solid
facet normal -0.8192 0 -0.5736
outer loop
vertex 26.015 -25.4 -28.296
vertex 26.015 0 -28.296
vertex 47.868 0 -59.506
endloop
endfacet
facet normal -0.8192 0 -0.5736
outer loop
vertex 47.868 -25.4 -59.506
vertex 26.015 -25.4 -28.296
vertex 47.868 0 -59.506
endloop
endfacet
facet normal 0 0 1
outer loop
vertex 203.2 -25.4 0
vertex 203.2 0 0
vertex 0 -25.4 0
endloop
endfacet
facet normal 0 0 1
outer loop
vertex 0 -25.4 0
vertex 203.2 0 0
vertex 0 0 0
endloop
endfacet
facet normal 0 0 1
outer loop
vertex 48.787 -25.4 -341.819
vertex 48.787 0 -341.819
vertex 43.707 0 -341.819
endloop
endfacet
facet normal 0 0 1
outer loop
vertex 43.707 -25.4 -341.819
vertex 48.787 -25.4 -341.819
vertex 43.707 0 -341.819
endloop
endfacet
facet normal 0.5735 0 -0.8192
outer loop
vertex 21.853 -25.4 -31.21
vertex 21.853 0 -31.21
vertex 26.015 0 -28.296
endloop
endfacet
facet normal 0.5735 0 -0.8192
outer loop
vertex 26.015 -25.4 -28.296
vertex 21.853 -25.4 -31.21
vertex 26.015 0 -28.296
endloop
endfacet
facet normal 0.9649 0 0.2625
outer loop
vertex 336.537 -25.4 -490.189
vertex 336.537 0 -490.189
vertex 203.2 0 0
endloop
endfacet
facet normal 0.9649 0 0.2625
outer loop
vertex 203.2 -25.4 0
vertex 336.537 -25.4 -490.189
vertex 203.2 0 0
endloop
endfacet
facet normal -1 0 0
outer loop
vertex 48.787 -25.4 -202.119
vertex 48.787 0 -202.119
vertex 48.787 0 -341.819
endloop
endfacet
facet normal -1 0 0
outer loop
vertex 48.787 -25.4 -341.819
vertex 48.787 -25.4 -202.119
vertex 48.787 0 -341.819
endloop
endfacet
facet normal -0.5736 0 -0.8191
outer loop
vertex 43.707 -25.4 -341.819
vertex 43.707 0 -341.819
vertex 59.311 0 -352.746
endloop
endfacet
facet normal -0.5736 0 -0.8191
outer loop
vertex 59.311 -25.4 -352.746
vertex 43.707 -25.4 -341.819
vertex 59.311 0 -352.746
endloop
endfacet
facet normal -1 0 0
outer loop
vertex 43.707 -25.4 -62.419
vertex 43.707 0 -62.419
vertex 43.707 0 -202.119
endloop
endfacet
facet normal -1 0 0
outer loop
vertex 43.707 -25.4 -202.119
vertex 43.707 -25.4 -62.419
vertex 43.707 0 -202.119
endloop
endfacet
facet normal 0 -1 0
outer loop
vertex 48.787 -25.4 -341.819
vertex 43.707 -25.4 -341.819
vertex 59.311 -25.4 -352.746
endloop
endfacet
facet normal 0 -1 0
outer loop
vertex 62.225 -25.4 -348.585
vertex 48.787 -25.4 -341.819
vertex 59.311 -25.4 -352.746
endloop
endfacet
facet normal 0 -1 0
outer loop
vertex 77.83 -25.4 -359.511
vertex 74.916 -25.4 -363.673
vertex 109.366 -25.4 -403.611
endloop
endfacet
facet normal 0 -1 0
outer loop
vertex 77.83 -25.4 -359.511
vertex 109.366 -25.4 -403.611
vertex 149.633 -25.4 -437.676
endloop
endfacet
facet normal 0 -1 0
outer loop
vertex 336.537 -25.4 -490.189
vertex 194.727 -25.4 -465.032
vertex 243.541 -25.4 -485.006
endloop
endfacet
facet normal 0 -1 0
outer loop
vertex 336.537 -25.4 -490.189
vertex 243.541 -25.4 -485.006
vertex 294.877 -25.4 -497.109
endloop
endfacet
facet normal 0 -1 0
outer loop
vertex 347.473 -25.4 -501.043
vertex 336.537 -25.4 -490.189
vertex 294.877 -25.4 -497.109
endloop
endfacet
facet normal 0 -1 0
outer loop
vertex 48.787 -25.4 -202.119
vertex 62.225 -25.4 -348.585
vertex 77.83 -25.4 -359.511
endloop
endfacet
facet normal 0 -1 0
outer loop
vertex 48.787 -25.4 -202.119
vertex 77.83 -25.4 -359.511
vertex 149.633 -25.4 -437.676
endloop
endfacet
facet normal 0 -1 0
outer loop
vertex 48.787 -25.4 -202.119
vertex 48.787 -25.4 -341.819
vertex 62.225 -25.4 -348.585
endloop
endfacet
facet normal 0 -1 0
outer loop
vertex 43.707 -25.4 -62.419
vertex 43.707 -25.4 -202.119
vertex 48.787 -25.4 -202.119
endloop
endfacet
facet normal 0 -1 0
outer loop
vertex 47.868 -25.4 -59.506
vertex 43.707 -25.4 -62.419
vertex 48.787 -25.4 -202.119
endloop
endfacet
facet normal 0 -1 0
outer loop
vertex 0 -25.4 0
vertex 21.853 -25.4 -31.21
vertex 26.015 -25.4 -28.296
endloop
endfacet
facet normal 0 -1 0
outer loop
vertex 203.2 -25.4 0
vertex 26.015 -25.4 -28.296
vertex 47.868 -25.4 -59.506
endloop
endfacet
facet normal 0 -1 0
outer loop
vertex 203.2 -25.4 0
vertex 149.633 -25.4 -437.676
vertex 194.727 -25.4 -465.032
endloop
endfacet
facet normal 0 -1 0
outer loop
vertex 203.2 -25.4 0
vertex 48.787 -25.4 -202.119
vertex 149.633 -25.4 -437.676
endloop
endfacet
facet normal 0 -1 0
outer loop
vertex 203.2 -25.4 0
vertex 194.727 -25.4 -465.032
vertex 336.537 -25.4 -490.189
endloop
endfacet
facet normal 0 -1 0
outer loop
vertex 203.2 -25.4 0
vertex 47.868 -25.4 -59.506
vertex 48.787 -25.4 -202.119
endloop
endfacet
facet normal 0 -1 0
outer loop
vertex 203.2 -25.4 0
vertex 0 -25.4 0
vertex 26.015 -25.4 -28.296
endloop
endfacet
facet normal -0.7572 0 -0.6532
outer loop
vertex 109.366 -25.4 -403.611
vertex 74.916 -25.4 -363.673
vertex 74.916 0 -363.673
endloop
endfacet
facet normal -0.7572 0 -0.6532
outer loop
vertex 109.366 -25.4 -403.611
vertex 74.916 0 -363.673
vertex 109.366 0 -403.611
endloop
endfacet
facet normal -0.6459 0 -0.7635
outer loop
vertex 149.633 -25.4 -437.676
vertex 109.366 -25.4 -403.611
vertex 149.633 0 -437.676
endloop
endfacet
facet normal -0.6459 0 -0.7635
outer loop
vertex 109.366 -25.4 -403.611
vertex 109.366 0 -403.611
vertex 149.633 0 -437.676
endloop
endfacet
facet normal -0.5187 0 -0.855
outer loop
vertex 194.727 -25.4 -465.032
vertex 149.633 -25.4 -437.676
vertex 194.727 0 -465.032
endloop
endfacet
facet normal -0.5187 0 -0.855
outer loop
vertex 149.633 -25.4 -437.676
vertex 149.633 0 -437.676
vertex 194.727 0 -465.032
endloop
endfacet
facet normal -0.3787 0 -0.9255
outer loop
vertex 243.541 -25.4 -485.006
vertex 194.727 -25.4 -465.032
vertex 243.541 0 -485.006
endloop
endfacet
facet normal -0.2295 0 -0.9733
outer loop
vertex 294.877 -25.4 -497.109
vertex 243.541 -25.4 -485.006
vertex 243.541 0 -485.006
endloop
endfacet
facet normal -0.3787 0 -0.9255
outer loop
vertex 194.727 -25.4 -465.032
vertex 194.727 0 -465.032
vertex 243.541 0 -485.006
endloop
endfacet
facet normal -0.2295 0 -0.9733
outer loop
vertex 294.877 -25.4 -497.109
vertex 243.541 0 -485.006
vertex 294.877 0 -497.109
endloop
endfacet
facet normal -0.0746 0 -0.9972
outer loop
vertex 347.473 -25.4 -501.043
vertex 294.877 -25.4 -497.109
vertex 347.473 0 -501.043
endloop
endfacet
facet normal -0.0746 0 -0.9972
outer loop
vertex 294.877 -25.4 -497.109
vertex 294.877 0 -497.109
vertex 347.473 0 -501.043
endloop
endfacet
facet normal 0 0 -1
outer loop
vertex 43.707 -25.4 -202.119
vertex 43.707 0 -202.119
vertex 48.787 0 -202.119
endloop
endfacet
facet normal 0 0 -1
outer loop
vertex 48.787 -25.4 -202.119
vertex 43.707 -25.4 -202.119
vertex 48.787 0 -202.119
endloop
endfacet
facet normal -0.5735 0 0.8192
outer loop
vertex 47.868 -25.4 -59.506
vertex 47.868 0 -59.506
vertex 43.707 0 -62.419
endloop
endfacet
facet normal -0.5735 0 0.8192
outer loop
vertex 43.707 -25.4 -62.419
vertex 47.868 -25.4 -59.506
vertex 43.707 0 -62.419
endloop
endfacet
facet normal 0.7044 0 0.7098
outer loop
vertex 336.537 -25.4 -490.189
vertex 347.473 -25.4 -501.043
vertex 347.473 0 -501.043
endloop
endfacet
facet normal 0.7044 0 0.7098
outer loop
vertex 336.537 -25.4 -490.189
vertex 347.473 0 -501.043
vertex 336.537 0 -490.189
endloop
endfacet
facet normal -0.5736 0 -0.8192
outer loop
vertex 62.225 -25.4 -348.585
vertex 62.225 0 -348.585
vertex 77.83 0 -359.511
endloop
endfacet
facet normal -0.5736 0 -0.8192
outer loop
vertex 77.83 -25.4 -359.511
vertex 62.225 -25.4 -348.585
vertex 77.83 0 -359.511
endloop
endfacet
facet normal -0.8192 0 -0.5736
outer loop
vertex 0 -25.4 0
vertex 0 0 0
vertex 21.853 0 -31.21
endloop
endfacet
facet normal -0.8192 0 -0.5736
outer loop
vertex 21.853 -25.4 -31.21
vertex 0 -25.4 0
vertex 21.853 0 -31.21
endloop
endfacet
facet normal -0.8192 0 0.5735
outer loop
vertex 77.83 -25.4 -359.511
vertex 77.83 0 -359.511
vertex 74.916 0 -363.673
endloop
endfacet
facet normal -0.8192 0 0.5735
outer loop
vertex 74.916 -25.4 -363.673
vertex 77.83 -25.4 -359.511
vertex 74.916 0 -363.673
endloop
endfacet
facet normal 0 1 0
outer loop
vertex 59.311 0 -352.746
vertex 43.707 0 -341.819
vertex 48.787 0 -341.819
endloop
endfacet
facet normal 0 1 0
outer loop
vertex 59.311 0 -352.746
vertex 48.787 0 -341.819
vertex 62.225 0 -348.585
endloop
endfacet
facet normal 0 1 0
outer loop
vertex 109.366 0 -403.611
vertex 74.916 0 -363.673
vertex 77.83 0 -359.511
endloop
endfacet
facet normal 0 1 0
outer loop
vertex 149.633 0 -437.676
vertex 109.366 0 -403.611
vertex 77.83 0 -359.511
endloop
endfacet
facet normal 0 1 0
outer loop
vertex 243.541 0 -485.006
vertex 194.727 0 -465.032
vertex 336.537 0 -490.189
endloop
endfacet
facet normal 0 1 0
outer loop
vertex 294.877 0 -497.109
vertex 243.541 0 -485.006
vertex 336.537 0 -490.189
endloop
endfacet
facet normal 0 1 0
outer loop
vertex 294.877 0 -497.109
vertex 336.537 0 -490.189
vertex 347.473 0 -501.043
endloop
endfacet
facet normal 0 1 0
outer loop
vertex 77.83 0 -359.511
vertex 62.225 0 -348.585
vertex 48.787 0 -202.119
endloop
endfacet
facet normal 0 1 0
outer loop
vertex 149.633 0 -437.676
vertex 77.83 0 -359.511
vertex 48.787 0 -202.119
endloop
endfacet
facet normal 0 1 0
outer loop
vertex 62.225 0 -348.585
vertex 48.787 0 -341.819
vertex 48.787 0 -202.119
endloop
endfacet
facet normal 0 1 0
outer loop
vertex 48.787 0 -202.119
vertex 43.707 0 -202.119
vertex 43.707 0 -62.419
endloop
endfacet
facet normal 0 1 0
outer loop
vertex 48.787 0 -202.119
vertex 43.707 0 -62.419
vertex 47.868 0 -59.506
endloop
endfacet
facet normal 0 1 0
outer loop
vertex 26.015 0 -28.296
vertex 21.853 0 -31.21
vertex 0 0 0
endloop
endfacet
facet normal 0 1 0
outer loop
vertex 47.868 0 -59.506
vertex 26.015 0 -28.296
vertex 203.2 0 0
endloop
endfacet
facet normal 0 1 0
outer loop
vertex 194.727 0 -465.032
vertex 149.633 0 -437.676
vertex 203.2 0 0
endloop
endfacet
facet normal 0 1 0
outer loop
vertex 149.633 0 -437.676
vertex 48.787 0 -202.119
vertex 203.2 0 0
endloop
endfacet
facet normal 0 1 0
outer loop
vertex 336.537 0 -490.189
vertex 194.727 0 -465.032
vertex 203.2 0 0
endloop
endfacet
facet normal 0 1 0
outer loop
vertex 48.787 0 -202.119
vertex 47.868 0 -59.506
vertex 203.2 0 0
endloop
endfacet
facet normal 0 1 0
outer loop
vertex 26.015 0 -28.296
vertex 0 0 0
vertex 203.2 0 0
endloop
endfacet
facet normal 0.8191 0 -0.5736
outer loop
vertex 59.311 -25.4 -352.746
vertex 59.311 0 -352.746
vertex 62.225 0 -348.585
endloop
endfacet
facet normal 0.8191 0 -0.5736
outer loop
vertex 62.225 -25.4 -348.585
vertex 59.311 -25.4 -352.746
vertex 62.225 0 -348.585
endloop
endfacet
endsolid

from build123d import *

# Parameters (mm, degrees)
F1_DEPTH = 25.4


with BuildPart() as f1:
    # F0 (on Front) → F1 (new body)
    with BuildSketch(Plane.XZ):
        with BuildLine():
            Line((203.2, 0), (0, 0))
            Line((0, 0), (21.853262, -31.209693))
            Line((21.853262, -31.209693), (26.014555, -28.295925))
            Line((26.014555, -28.295925), (47.867817, -59.505617))
            Line((47.867817, -59.505617), (43.706524, -62.419386))
            Line((43.706524, -62.419386), (43.706524, -202.119386))
            Line((43.706524, -202.119386), (48.786524, -202.119386))
            Line((48.786524, -202.119386), (48.786524, -341.819386))
            Line((48.786524, -341.819386), (43.706524, -341.819386))
            Line((43.706524, -341.819386), (59.311371, -352.746017))
            Line((59.311371, -352.746017), (62.225139, -348.584725))
            Line((62.225139, -348.584725), (77.829986, -359.511356))
            Line((77.829986, -359.511356), (74.916217, -363.672648))
            ThreePointArc((74.916217, -363.672648), (194.72671, -465.031598), (347.472841, -501.042848))
            Line((347.472841, -501.042848), (336.536605, -490.189096))
            Line((336.536605, -490.189096), (203.2, 0))
        make_face()
    extrude(amount=F1_DEPTH)


solid = f1.part
